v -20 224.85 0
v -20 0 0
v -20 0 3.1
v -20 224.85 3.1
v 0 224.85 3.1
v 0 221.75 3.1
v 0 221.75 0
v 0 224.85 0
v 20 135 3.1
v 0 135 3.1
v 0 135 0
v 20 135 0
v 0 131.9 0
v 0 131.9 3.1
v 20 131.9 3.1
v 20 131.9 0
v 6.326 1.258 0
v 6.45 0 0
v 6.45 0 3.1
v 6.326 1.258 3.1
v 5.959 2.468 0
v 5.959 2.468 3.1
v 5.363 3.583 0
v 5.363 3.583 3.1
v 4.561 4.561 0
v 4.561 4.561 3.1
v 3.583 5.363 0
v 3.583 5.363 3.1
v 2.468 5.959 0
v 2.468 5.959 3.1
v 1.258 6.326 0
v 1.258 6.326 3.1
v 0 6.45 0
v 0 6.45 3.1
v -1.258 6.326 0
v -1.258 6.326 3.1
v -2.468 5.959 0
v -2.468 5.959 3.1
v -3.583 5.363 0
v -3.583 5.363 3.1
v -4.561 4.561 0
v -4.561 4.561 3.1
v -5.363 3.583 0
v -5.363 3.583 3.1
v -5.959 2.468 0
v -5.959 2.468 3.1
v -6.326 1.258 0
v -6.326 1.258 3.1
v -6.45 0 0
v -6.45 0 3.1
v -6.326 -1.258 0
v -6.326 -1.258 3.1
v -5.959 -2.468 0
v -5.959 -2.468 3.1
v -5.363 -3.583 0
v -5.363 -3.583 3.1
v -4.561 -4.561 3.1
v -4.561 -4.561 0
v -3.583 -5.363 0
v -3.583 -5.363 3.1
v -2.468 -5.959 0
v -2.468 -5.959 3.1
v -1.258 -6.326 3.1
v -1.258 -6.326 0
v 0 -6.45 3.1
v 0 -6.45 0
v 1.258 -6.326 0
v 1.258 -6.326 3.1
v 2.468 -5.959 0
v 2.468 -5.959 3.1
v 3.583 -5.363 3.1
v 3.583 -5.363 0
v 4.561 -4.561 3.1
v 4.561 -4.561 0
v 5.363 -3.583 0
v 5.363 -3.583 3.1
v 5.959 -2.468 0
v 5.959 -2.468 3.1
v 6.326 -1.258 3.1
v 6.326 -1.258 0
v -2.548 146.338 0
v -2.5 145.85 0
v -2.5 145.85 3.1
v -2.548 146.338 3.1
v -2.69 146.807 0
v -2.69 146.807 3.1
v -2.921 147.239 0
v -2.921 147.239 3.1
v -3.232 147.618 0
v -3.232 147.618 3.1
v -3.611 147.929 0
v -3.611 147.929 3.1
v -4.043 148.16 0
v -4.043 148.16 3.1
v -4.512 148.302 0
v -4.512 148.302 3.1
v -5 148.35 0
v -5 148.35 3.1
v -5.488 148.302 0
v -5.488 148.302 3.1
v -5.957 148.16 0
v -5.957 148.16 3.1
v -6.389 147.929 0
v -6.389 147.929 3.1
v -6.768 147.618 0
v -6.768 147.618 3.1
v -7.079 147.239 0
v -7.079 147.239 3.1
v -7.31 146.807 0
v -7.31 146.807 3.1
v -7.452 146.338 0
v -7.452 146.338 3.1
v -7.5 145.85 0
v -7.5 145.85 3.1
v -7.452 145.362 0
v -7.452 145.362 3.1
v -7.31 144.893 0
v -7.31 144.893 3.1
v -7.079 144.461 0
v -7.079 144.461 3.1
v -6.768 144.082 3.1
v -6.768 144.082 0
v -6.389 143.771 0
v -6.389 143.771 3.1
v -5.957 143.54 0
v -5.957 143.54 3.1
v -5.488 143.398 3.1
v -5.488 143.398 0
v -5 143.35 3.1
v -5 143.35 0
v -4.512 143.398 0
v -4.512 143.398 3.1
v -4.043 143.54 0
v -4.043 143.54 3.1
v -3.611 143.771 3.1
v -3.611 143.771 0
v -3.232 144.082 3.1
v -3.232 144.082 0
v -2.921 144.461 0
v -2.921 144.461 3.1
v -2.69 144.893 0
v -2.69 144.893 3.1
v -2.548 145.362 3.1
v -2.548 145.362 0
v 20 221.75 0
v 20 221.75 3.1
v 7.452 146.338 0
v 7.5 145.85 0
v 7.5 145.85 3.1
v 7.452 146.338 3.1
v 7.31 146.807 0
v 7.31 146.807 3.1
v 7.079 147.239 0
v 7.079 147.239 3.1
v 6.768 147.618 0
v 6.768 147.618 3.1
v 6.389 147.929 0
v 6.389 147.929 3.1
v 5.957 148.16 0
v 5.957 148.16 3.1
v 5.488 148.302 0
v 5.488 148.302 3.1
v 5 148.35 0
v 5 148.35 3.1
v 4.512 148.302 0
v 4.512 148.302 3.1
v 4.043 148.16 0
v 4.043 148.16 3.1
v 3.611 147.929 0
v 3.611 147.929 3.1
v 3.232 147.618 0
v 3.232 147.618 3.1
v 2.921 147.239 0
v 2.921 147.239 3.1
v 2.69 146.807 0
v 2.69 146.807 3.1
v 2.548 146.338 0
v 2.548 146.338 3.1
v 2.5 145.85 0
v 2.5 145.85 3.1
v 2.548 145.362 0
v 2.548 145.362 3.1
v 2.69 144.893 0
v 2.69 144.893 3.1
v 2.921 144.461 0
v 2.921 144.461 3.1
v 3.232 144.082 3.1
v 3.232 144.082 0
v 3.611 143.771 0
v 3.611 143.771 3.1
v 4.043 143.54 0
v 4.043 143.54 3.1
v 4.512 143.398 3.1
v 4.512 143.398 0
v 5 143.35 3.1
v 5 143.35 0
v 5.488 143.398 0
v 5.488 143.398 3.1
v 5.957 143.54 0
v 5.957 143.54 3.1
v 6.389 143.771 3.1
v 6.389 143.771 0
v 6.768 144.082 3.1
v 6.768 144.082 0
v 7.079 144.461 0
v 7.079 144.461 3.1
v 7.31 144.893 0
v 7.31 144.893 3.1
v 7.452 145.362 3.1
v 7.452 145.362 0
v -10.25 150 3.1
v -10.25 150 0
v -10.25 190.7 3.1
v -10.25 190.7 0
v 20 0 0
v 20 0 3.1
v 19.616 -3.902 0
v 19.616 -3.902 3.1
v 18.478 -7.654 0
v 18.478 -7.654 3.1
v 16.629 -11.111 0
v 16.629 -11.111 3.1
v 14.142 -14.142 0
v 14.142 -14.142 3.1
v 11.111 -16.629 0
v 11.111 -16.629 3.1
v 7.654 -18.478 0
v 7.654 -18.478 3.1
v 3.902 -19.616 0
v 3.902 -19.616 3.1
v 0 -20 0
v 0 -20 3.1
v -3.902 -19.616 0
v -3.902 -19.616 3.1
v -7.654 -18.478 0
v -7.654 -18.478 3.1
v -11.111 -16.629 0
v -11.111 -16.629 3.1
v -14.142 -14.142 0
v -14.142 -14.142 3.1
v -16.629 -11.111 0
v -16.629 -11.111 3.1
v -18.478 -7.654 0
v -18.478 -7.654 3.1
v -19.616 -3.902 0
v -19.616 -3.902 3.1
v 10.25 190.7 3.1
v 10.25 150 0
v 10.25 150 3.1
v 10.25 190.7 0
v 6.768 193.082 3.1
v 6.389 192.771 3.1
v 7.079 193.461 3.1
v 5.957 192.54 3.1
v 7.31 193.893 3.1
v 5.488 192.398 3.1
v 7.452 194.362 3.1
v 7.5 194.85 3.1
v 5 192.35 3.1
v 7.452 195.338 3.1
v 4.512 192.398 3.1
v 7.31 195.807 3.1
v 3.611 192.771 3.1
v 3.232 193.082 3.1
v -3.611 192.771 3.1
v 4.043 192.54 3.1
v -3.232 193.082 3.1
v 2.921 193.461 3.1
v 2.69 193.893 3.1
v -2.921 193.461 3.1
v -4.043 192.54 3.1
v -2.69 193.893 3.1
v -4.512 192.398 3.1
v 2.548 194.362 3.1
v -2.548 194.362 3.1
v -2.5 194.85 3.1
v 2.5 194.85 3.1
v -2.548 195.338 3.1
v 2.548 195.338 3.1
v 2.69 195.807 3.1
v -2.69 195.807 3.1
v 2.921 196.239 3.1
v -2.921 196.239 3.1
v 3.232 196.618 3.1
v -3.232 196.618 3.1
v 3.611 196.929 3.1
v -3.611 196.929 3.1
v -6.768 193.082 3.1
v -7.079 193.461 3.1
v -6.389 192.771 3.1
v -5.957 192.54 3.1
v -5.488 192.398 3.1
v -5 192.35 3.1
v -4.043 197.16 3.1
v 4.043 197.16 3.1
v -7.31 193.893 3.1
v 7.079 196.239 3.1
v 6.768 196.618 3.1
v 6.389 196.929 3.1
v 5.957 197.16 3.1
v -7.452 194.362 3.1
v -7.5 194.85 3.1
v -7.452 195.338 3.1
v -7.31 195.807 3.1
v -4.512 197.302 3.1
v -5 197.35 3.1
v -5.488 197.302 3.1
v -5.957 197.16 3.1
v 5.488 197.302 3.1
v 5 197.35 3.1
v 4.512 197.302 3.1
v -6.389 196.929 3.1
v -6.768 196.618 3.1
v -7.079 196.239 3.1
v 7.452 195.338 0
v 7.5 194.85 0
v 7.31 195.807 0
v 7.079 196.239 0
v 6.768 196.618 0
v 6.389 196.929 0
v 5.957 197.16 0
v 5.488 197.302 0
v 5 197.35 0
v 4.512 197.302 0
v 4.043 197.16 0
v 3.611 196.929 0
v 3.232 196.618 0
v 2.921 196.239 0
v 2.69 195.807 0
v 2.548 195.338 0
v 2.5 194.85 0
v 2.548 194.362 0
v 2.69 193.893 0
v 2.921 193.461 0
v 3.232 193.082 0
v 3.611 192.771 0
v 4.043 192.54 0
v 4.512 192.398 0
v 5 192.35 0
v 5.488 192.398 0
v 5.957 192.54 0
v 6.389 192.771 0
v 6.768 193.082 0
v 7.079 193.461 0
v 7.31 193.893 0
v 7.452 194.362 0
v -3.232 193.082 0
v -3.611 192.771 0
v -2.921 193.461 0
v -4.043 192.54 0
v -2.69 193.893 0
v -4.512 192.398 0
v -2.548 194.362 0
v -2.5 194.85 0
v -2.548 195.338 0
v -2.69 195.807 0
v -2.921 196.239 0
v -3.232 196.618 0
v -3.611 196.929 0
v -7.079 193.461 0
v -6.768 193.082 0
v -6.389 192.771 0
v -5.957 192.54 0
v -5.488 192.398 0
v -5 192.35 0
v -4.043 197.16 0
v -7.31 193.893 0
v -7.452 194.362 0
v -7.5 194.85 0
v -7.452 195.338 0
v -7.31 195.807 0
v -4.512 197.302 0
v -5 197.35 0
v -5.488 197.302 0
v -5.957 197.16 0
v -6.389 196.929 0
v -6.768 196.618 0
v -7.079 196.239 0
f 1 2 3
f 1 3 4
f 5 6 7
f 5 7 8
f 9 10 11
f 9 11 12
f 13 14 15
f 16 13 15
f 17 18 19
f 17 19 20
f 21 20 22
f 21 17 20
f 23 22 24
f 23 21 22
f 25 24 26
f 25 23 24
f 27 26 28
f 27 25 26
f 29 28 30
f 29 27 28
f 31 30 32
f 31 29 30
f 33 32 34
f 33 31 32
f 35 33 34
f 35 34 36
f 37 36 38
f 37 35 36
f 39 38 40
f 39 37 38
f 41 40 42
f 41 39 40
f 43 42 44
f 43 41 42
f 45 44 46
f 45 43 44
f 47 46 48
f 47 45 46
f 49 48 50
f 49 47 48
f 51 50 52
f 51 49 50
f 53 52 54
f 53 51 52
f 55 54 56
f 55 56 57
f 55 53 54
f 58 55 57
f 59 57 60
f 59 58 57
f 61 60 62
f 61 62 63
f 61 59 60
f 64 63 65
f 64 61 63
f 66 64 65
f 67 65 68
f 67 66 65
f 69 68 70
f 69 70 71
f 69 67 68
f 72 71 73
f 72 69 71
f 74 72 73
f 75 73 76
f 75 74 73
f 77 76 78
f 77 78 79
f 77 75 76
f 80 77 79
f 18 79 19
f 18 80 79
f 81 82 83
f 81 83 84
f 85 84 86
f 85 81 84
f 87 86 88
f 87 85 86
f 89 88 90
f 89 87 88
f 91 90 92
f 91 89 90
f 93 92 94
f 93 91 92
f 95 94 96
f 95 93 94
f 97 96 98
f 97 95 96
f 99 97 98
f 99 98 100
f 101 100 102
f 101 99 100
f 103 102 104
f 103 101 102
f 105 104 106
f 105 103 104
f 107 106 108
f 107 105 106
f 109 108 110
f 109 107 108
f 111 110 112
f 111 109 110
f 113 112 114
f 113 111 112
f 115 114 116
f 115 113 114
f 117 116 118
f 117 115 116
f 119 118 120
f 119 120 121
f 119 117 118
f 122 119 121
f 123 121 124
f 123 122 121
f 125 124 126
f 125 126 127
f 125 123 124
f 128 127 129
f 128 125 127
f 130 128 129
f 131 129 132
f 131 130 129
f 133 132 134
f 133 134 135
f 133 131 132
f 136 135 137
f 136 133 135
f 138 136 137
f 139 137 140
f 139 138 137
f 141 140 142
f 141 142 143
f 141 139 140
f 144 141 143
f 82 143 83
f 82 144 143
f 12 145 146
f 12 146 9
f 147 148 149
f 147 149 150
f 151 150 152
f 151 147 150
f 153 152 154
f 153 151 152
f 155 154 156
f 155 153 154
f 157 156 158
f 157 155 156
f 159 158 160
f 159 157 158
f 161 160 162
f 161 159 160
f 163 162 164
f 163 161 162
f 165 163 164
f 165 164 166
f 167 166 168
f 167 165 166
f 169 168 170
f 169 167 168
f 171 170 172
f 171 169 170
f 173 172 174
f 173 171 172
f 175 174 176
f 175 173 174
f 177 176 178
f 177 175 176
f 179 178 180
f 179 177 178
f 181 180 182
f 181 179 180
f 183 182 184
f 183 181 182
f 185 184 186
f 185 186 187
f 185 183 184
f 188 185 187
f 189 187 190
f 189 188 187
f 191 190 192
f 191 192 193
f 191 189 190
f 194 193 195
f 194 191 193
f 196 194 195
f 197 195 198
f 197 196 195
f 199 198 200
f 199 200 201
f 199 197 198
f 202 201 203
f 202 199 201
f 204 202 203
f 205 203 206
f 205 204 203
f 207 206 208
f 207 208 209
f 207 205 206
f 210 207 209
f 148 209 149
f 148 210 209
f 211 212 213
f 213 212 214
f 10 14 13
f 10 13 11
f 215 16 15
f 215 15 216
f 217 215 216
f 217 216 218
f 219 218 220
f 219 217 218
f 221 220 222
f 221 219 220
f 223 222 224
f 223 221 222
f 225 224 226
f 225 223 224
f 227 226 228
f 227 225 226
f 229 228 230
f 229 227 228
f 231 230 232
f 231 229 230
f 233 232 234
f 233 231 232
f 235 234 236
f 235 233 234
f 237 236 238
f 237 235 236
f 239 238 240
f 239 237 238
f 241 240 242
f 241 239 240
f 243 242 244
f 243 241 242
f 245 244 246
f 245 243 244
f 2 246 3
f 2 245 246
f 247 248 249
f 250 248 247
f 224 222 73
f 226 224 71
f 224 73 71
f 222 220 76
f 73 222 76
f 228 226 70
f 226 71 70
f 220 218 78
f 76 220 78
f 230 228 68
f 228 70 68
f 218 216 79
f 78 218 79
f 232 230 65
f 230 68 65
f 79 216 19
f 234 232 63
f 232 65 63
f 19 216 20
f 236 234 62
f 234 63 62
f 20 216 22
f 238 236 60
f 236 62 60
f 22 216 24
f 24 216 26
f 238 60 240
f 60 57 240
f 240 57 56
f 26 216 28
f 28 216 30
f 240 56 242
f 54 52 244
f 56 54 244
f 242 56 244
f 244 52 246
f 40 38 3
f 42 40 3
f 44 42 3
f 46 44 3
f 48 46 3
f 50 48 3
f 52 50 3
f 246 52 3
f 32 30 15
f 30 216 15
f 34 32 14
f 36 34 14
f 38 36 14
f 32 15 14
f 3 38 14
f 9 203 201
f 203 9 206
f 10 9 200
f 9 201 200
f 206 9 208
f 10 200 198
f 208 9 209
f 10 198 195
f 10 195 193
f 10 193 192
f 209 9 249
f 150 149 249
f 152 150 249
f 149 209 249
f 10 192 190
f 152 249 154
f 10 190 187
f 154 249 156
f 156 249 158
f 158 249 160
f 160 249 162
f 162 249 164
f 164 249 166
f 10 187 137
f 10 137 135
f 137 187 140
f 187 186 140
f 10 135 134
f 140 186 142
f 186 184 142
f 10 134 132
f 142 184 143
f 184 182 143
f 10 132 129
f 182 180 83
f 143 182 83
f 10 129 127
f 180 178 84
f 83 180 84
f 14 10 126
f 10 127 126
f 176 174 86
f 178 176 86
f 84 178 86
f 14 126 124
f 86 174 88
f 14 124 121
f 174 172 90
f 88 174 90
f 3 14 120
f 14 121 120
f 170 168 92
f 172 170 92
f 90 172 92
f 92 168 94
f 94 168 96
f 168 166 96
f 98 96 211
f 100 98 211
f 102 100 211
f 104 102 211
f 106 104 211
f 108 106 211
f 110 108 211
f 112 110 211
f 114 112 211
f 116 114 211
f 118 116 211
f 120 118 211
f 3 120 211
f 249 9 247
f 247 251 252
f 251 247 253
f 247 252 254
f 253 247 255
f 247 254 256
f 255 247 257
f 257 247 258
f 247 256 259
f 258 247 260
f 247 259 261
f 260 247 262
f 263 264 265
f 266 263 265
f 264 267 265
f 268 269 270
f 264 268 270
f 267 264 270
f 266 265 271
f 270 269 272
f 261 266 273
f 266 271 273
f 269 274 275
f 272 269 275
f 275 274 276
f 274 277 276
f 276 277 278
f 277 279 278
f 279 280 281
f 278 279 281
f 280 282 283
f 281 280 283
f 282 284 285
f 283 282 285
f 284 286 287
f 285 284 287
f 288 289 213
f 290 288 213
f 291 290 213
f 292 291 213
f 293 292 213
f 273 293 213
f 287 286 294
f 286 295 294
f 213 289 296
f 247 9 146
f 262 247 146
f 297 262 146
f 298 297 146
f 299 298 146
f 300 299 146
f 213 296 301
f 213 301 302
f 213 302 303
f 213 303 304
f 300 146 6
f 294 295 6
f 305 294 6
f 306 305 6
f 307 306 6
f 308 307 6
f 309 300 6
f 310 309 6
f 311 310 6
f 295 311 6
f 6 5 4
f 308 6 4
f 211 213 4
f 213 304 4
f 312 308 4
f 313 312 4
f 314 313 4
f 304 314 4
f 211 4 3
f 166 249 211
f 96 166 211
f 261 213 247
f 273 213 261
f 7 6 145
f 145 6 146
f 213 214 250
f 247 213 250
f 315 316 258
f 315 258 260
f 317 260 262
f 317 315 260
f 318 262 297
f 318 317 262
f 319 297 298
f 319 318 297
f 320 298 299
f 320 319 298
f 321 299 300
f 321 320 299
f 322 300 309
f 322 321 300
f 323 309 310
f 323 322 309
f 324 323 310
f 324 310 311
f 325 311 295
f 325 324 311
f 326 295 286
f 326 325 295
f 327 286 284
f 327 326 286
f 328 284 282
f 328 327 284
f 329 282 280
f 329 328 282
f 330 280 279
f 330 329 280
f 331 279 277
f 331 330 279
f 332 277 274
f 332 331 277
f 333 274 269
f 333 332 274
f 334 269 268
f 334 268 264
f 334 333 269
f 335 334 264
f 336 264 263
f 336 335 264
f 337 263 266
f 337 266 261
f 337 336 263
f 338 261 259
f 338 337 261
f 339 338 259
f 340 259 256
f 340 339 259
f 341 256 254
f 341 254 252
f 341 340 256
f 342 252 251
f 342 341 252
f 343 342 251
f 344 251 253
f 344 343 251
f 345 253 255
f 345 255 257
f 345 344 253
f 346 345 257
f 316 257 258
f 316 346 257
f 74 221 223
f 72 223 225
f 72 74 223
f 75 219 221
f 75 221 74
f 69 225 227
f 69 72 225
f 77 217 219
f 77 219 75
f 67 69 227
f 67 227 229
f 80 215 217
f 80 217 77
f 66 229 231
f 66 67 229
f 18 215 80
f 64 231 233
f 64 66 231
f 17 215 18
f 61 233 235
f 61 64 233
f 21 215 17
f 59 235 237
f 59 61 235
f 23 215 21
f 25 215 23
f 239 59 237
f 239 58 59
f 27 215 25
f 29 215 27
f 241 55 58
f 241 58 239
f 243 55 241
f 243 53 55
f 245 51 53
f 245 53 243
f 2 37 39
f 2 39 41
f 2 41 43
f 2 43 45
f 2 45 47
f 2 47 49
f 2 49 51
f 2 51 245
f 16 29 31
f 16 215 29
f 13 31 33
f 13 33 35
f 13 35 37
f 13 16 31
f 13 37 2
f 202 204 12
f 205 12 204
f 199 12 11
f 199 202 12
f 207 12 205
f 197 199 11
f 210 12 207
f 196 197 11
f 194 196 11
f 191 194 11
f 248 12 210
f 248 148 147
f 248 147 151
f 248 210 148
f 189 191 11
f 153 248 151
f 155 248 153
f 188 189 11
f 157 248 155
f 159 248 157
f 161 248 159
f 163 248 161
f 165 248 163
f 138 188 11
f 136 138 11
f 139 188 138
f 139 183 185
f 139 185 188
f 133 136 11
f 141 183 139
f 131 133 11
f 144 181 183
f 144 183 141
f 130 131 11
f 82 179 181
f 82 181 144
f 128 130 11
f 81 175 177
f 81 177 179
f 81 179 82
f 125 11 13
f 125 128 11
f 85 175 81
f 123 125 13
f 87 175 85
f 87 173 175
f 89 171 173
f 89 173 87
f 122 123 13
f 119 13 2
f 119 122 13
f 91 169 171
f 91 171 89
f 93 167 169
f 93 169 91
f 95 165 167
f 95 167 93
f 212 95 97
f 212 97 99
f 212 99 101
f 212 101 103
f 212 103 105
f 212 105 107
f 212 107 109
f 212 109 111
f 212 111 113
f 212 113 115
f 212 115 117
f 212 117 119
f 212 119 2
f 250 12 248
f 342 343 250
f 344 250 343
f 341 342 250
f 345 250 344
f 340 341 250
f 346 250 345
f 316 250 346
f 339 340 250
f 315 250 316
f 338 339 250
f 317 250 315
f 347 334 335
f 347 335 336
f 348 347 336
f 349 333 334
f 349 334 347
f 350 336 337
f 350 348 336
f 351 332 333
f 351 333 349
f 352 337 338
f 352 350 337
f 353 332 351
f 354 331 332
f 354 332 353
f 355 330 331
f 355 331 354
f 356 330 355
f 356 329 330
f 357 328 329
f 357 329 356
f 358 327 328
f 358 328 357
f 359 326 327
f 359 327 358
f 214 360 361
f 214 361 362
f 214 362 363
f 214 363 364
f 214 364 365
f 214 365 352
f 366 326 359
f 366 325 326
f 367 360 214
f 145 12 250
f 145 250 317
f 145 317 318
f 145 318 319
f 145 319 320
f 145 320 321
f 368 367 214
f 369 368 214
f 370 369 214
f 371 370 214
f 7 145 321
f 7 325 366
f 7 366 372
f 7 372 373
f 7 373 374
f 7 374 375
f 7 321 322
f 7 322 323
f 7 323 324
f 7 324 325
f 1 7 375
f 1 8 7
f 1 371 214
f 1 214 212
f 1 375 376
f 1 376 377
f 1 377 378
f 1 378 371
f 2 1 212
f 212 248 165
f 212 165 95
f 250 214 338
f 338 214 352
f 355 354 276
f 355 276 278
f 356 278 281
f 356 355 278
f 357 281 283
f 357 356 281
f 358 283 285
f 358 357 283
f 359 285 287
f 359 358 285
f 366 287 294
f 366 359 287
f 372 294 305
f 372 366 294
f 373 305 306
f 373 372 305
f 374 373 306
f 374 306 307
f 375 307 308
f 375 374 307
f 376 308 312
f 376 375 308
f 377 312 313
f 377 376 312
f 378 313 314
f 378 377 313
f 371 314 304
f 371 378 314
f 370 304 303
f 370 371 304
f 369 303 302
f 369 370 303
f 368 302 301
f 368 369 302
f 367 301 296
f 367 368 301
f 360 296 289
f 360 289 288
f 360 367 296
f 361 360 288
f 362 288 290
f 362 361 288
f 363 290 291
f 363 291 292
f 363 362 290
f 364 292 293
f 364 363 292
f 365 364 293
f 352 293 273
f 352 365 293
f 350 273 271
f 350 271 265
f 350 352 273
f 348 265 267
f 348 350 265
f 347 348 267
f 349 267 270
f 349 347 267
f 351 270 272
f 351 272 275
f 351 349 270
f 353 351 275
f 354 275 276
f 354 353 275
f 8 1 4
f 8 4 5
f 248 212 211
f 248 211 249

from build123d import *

# Parameters (mm, degrees)
SKETCH1_R           = 6.45
SKETCH1_R_2         = 2.5
SKETCH1_W           = 20.5
SKETCH1_H           = 40.7
BOSS_EXTRUDE1_DEPTH = 3.1
SKETCH2_W           = 20.093106281
SKETCH2_H           = 3.1
SKETCH2_W_2         = 20
CUT_EXTRUDE1_DEPTH  = 4.1


with BuildPart() as part:
    # Sketch1 → Boss-Extrude1 (new body)
    with BuildSketch(Plane.XY):
        with BuildLine():
            Line((-20, 0), (-20, 224.85))
            Line((-20, 224.85), (20, 224.85))
            Line((20, 224.85), (20, 0))
            ThreePointArc((20, 0), (0, -20), (-20, 0))
        make_face()
        Circle(SKETCH1_R, mode=Mode.SUBTRACT)
        with Locations((5, 145.85)):
            Circle(SKETCH1_R_2, mode=Mode.SUBTRACT)
        with Locations((-5, 145.85)):
            Circle(SKETCH1_R_2, mode=Mode.SUBTRACT)
        with Locations((-5, 194.85)):
            Circle(SKETCH1_R_2, mode=Mode.SUBTRACT)
        with Locations((5, 194.85)):
            Circle(SKETCH1_R_2, mode=Mode.SUBTRACT)
        with Locations((0, 170.35)):
            Rectangle(SKETCH1_W, SKETCH1_H, mode=Mode.SUBTRACT)
    extrude(amount=BOSS_EXTRUDE1_DEPTH)

    # Sketch2 → Cut-Extrude1 (cut, through all)
    with BuildSketch(Plane.XY.offset(3.1)):
        with Locations((10.046553141, 223.3)):
            Rectangle(SKETCH2_W, SKETCH2_H)
        with Locations((10, 133.45)):
            Rectangle(SKETCH2_W_2, SKETCH2_H)
    extrude(amount=-CUT_EXTRUDE1_DEPTH, mode=Mode.SUBTRACT)


solid = part.part
